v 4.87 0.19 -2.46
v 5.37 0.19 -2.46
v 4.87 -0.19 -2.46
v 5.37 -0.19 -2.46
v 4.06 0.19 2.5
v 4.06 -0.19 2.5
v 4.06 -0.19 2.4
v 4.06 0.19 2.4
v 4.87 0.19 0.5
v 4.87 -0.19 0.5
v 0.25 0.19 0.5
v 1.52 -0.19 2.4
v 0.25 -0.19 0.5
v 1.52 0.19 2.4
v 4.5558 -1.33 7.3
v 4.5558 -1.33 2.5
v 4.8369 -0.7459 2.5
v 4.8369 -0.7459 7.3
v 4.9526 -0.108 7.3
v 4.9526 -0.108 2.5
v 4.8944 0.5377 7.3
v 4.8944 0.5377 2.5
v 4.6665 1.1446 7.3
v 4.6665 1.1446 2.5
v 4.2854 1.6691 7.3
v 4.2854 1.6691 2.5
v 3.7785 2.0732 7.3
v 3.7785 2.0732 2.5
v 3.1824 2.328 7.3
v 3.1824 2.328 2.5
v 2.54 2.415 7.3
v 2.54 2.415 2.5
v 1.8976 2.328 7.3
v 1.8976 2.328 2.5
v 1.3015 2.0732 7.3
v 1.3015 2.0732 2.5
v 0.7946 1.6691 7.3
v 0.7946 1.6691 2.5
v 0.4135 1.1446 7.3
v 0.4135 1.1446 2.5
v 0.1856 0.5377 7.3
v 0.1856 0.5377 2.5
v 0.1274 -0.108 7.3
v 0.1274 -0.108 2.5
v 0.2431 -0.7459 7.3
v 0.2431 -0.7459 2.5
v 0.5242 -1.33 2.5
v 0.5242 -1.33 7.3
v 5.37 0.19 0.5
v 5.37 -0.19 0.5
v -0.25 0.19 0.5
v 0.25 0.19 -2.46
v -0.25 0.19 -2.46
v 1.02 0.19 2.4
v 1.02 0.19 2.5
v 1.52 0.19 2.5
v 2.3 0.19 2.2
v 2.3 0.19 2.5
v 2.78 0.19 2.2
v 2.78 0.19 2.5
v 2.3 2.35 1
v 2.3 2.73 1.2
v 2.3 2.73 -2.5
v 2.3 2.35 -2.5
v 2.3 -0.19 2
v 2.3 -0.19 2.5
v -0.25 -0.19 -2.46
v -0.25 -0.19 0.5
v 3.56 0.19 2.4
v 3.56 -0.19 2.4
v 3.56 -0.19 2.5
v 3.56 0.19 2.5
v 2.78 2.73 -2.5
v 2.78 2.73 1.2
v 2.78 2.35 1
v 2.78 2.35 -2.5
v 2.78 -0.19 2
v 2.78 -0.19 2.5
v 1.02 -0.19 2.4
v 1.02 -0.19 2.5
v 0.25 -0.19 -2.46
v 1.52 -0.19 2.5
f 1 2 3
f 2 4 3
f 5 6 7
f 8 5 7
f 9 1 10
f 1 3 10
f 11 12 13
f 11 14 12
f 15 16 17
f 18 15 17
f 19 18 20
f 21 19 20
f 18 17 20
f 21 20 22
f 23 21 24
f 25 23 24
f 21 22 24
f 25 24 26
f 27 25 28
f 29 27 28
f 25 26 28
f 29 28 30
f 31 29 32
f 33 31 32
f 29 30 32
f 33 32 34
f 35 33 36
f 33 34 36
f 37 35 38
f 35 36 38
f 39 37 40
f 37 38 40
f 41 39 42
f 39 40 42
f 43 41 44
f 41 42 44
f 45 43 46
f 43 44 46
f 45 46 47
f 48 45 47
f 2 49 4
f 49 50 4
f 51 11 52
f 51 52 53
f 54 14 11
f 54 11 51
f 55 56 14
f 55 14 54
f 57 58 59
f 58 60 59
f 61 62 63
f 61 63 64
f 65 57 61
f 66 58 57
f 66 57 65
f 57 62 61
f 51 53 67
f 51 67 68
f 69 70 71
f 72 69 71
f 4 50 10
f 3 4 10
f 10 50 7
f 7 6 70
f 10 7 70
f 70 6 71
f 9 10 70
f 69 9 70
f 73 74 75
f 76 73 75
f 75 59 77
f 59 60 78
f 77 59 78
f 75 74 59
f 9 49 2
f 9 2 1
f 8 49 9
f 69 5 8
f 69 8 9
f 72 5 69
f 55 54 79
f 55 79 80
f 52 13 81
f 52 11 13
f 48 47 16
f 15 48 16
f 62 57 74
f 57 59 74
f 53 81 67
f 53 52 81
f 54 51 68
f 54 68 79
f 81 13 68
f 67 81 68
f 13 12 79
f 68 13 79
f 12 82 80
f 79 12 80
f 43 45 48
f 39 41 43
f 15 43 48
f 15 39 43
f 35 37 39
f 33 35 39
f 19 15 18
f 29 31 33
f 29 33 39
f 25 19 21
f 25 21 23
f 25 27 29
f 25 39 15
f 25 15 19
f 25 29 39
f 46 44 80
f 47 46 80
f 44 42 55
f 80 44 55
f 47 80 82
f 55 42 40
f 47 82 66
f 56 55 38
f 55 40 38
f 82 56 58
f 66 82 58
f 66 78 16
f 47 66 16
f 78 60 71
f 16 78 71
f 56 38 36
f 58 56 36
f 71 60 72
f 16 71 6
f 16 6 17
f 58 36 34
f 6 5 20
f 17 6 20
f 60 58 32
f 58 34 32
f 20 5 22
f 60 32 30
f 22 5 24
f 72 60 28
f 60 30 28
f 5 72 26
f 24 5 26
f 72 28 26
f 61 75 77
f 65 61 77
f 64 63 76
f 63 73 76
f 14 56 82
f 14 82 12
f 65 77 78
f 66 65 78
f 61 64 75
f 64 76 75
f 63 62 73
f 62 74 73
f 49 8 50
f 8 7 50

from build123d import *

# Parameters (mm, degrees)
PAD001_DEPTH = 0.19
PAD_DEPTH    = 4.8
PAD002_DEPTH = 0.24


with BuildPart() as pad001:
    # Sketch001 → Pad001 (new body, symmetric)
    with BuildSketch(Plane.XZ):
        Polygon((0.25, -2.46), (-0.25, -2.46), (-0.25, 0.5), (1.02, 2.4), (1.02, 3.04), (1.52, 3.04), (1.52, 2.4), (0.25, 0.5), align=None)
        Polygon((3.56, 3.04), (4.06, 3.04), (4.06, 2.4), (5.37, 0.5), (5.37, -2.46), (4.87, -2.46), (4.87, 0.5), (3.56, 2.4), align=None)
    extrude(amount=PAD001_DEPTH, both=True)


with BuildPart() as pad:
    # Sketch → Pad (new body)
    with BuildSketch(Plane.XY.offset(2.5)):
        with BuildLine():
            Line((0.524231, -1.33), (4.555769, -1.33))
            ThreePointArc((4.555769, -1.33), (2.54, 2.415), (0.524231, -1.33))
        make_face()
    extrude(amount=PAD_DEPTH)


with BuildPart() as to_92_wide:
    # Sketch002 → Pad002 (new body, symmetric)
    with BuildSketch(Plane.YZ.offset(2.54)):
        Polygon((-0.19, 2.5), (0.19, 2.5), (0.19, 2.2), (2.73, 1.2), (2.73, -2.5), (2.35, -2.5), (2.35, 1), (-0.19, 2), align=None)
    extrude(amount=PAD002_DEPTH, both=True)

    # Pad002_mp_cp: union Pad001, Pad
    add(pad001.part)
    add(pad.part)


solid = to_92_wide.part
